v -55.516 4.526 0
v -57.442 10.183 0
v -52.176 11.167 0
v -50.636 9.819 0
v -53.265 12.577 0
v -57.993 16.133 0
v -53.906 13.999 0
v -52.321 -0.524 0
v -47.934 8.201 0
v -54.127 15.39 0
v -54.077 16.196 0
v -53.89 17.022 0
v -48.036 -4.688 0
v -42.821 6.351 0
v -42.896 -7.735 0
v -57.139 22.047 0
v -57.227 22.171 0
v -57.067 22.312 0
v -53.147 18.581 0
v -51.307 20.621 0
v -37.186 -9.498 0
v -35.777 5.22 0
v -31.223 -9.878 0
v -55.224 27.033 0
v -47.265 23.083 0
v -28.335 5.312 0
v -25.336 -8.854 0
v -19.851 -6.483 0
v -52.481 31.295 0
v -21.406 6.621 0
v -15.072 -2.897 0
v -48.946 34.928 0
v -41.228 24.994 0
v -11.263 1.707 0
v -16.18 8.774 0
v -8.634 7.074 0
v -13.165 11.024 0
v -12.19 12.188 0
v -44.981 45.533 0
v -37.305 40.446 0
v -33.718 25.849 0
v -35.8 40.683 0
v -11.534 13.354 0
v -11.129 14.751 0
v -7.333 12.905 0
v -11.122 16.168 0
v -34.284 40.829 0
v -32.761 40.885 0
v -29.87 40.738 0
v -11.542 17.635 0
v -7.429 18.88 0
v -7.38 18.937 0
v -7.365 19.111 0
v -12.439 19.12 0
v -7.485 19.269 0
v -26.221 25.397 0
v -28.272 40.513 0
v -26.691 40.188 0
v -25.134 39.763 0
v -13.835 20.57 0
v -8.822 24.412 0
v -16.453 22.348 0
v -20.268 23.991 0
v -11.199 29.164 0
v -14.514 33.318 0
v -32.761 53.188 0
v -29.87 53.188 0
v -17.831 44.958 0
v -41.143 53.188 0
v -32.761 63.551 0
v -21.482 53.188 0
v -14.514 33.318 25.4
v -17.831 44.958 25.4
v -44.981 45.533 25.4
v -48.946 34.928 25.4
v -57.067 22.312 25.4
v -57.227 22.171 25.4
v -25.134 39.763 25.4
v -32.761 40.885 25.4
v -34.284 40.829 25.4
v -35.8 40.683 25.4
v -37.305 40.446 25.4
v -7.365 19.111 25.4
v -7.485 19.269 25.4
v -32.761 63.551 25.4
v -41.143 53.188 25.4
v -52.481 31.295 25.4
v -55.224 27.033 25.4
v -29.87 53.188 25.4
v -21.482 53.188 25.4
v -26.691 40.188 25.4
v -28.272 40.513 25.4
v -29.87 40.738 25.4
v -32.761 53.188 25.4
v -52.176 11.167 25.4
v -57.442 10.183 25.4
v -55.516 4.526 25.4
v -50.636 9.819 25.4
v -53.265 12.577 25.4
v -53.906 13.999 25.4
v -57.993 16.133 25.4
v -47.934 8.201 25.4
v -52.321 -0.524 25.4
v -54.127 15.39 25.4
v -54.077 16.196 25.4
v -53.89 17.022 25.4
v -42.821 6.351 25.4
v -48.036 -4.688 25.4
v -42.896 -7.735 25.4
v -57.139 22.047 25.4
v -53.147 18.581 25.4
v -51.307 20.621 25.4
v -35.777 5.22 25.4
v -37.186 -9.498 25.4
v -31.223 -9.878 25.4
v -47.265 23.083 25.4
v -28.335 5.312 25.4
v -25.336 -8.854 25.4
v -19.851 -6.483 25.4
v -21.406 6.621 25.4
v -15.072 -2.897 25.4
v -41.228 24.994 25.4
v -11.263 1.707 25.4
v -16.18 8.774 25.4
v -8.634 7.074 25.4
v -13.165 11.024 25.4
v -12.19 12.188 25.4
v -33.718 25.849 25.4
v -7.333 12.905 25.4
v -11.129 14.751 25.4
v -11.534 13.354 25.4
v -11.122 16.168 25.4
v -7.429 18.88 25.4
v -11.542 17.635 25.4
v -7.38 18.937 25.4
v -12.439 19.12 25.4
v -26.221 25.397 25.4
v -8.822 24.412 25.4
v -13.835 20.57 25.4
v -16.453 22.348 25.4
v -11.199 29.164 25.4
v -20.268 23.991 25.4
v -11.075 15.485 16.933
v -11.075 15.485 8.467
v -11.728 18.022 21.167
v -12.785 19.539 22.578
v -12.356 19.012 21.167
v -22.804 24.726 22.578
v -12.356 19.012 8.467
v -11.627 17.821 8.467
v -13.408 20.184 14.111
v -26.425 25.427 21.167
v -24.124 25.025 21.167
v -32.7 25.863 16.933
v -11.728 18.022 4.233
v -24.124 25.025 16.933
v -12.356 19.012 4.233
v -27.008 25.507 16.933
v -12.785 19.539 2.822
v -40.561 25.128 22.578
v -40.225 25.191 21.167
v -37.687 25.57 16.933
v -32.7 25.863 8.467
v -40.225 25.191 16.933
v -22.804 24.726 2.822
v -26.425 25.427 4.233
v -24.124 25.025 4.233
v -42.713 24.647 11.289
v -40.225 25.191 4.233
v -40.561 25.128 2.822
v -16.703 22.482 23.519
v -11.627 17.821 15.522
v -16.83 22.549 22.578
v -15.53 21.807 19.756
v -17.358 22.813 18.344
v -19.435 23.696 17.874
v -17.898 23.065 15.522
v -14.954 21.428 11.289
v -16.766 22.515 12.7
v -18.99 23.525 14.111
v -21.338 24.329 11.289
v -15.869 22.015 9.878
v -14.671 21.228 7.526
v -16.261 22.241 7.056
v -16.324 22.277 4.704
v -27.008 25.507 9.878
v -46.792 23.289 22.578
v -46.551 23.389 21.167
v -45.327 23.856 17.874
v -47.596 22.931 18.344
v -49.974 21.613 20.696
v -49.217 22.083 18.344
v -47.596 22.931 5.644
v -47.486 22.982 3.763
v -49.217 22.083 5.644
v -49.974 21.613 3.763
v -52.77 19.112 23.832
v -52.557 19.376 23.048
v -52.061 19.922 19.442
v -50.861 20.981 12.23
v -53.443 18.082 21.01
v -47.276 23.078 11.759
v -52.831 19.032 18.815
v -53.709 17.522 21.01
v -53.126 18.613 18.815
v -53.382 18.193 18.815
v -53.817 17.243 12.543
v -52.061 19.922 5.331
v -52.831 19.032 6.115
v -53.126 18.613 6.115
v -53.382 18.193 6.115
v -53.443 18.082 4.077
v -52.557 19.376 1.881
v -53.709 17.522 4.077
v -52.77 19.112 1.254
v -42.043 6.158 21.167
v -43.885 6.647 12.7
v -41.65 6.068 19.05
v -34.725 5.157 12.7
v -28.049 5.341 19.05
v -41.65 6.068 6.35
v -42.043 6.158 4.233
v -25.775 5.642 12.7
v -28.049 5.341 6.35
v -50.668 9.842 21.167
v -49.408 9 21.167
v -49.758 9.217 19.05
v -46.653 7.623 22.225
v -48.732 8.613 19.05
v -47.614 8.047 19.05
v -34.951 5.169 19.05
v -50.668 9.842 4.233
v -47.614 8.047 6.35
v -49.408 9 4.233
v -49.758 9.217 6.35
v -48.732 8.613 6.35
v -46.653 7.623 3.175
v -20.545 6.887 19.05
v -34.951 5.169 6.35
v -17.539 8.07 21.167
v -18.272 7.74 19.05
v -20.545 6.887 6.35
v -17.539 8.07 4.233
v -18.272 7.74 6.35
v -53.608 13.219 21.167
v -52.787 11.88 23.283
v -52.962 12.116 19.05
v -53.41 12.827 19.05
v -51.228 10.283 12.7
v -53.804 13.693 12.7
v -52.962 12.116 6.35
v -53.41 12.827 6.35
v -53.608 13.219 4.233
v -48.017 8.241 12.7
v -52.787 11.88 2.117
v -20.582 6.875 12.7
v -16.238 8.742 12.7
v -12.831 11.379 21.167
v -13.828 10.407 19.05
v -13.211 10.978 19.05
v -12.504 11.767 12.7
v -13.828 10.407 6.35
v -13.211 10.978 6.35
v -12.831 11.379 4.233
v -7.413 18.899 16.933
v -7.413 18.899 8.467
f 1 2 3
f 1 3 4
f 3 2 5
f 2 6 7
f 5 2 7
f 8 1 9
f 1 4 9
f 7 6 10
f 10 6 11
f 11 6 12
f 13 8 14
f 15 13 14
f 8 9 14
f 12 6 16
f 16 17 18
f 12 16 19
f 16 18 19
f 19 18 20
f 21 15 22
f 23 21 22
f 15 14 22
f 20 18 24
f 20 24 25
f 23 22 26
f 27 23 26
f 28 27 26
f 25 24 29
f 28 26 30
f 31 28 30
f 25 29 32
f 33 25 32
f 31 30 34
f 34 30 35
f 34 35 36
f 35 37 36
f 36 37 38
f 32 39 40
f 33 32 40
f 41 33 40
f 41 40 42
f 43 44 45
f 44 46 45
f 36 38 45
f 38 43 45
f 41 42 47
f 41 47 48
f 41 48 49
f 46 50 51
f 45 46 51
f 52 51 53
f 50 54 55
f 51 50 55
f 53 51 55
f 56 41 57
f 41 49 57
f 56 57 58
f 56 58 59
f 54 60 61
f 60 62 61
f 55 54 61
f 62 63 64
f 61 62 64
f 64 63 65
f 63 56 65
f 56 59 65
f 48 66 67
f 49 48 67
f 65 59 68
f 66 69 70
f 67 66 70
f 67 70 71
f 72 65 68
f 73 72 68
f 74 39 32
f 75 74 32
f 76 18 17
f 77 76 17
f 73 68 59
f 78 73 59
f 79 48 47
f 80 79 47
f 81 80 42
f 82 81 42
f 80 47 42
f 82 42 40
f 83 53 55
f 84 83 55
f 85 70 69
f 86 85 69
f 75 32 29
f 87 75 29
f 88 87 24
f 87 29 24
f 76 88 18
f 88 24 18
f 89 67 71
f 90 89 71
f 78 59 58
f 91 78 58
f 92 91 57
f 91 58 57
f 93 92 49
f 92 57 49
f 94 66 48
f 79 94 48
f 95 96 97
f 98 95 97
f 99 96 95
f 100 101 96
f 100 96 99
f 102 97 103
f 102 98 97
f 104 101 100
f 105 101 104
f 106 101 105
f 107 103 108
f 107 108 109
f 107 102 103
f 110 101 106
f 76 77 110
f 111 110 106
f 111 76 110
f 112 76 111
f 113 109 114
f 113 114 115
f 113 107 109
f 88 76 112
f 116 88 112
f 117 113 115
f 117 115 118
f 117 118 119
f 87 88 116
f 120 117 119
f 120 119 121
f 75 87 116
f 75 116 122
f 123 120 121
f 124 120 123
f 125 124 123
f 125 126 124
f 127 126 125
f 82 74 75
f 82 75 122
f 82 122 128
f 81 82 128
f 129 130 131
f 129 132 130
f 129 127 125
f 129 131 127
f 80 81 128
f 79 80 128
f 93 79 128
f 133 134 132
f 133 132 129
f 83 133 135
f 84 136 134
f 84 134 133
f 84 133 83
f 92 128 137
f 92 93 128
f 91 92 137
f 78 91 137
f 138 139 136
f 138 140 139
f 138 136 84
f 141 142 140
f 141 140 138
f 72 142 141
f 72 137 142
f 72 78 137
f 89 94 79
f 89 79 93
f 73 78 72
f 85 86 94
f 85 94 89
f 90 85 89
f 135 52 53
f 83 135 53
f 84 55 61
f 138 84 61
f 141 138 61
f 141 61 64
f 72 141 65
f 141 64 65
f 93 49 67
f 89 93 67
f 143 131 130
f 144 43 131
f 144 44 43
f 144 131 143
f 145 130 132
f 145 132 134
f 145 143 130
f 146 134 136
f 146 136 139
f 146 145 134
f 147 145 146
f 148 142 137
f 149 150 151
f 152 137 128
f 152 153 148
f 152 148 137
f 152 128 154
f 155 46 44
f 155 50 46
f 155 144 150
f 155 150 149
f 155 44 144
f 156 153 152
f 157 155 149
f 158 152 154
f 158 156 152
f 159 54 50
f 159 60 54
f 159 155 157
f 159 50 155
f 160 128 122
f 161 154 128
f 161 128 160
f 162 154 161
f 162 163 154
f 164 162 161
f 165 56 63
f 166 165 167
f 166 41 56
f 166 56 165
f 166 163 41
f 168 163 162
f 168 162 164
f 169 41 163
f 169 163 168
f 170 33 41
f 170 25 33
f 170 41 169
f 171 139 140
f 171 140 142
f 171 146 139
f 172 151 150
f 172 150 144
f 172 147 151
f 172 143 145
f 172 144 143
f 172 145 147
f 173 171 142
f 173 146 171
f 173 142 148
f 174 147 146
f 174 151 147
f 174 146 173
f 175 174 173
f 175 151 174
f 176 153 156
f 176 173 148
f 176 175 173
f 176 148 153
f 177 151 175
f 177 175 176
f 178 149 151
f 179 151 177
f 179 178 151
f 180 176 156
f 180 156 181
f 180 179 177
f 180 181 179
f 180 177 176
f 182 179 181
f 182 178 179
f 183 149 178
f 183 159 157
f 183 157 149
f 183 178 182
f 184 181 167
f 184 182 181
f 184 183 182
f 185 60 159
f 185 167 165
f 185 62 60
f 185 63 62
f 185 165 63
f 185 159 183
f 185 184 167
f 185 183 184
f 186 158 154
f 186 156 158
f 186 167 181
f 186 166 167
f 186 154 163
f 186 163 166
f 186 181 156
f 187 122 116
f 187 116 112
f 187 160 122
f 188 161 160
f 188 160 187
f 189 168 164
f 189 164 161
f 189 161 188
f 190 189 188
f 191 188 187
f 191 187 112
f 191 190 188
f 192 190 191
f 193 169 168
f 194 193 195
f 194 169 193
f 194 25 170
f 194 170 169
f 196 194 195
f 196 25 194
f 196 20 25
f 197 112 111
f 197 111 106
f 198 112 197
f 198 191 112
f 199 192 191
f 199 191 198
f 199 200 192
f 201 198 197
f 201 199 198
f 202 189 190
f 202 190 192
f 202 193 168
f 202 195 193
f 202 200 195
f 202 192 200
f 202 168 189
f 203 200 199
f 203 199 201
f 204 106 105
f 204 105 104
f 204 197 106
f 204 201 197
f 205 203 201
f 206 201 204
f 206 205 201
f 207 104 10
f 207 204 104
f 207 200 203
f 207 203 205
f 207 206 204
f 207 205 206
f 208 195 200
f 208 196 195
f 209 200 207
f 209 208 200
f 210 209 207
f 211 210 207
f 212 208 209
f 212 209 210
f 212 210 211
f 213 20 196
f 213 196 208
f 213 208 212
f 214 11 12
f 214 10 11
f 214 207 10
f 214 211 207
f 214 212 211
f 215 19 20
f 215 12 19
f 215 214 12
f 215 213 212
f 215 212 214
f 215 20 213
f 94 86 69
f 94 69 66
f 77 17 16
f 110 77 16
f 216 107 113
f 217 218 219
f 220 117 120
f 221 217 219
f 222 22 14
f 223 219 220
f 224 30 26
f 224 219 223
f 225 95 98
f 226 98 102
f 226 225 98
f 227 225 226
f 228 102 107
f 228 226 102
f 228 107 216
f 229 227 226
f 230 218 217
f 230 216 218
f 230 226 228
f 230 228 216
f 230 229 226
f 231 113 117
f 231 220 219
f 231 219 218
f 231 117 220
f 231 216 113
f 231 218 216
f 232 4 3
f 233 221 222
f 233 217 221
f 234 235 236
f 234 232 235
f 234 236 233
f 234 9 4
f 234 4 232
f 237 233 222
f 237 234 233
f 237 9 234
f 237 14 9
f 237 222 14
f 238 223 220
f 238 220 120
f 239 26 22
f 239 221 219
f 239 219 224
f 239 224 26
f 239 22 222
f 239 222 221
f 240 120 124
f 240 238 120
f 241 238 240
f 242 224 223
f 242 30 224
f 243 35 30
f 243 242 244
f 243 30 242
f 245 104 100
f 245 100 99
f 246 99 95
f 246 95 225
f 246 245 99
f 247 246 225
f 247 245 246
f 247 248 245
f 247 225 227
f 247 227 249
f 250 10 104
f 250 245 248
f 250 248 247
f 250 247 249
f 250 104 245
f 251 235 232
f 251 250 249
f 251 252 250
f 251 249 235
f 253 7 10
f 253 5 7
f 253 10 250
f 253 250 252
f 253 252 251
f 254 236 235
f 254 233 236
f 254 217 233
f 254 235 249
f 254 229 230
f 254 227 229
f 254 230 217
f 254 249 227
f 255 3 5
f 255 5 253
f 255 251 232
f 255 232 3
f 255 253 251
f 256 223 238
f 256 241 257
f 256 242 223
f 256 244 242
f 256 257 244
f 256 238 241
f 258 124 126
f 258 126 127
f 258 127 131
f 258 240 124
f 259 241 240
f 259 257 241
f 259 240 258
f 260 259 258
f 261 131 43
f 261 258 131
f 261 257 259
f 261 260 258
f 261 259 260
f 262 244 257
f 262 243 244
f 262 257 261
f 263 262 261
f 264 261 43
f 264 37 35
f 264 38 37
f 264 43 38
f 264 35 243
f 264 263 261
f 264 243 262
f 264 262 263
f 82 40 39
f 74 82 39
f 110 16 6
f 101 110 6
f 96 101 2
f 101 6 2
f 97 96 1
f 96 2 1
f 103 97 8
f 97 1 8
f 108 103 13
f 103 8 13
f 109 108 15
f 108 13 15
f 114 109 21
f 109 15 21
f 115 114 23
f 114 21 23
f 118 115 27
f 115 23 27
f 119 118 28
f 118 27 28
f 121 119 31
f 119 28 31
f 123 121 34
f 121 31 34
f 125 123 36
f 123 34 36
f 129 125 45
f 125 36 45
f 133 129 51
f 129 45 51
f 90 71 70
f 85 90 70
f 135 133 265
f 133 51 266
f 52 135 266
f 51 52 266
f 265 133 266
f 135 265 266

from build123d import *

# Parameters (mm, degrees)
F1_DEPTH = 25.4


with BuildPart() as f1:
    # F0 (on Top) → F1 (new body)
    with BuildSketch(Plane.XY):
        with BuildLine():
            Line((-44.980506, 45.533263), (-48.945944, 34.927538))
            ThreePointArc((-48.945944, 34.927538), (-53.959094, 29.232874), (-57.06671, 22.311632))
            ThreePointArc((-57.06671, 22.311632), (-57.10328, 22.179189), (-57.139133, 22.046551))
            add(Edge.make_bspline(
                [(-57.139133, 22.046551), (-55.951402, 19.76674), (-56.362879, 17.207652), (-54.538533, 15.65998), (-54.126684, 15.39029)],
                knots=[0, 0, 0, 0, 6.068521, 7.551351, 7.551351, 7.551351, 7.551351], degree=3))
            add(Edge.make_bspline(
                [(-11.074984, 15.485006), (-11.074984, 25.910861), (-32.699511, 25.863286), (-54.324038, 25.815711), (-54.126684, 15.39029)],
                knots=[0, 0, 0, 1.57536, 1.57536, 3.150719, 3.150719, 3.150719], degree=2, weights=[1, 0.705492, 1, 0.705492, 1]))
            add(Edge.make_bspline(
                [(-11.533519, 13.35431), (-11.074984, 14.40819), (-11.074984, 15.485006)],
                knots=[6.076414, 6.076414, 6.076414, 6.283185, 6.283185, 6.283185], degree=2, weights=[1, 0.99466, 1]))
            add(Edge.make_bspline(
                [(-11.533519, 13.35431), (-10.470214, 13.677684), (-9.705303, 14.334247), (-9.811295, 16.948305), (-8.481348, 17.689314), (-7.429187, 18.879946)],
                knots=[49.568314, 49.568314, 49.568314, 49.568314, 52.956399, 53.261198, 57.215077, 57.215077, 57.215077, 57.215077], degree=3))
            ThreePointArc((-7.429187, 18.879946), (-7.456191, 19.074493), (-7.484699, 19.268824))
            ThreePointArc((-7.484699, 19.268824), (-9.885867, 26.850301), (-14.513804, 33.317649))
            Line((-14.513804, 33.317649), (-17.8308, 44.958003))
            Line((-17.8308, 44.958003), (-25.134036, 39.762573))
            ThreePointArc((-25.134036, 39.762573), (-27.478957, 40.363145), (-29.8704, 40.737774))
            Line((-29.8704, 40.737774), (-29.8704, 53.187601))
            Line((-29.8704, 53.187601), (-21.482418, 53.187601))
            Line((-21.482418, 53.187601), (-32.760906, 63.5508))
            Line((-32.760906, 63.5508), (-41.142906, 53.187601))
            Line((-41.142906, 53.187601), (-32.760906, 53.187601))
            Line((-32.760906, 53.187601), (-32.760906, 40.884505))
            ThreePointArc((-32.760906, 40.884505), (-35.042987, 40.767373), (-37.305306, 40.445618))
            Line((-37.305306, 40.445618), (-44.980506, 45.533263))
        make_face()
        with BuildLine():
            ThreePointArc((-57.139133, 22.046551), (-57.10328, 22.179189), (-57.06671, 22.311632))
            Line((-57.06671, 22.311632), (-57.226889, 22.170573))
            Line((-57.226889, 22.170573), (-57.139133, 22.046551))
        make_face()
        with BuildLine():
            add(Edge.make_bspline(
                [(-57.139133, 22.046551), (-55.951402, 19.76674), (-56.362879, 17.207652), (-54.538533, 15.65998), (-54.126684, 15.39029)],
                knots=[0, 0, 0, 0, 6.068521, 7.551351, 7.551351, 7.551351, 7.551351], degree=3))
            ThreePointArc((-57.139133, 22.046551), (-34.216031, -9.863615), (-7.429187, 18.879946))
            add(Edge.make_bspline(
                [(-11.533519, 13.35431), (-10.470214, 13.677684), (-9.705303, 14.334247), (-9.811295, 16.948305), (-8.481348, 17.689314), (-7.429187, 18.879946)],
                knots=[49.568314, 49.568314, 49.568314, 49.568314, 52.956399, 53.261198, 57.215077, 57.215077, 57.215077, 57.215077], degree=3))
            add(Edge.make_bspline(
                [(-54.126684, 15.39029), (-53.950368, 6.076234), (-34.725104, 5.157255), (-15.499841, 4.238275), (-11.533519, 13.35431)],
                knots=[3.150719, 3.150719, 3.150719, 4.613566, 4.613566, 6.076414, 6.076414, 6.076414], degree=2, weights=[1, 0.744224, 1, 0.744224, 1]))
        make_face()
        with BuildLine():
            ThreePointArc((-7.484699, 19.268824), (-7.456191, 19.074493), (-7.429187, 18.879946))
            add(Edge.make_bspline(
                [(-7.429187, 18.879946), (-7.412604, 18.898711), (-7.396067, 18.917601), (-7.37958, 18.936621)],
                knots=[57.215077, 57.215077, 57.215077, 57.215077, 57.277393, 57.277393, 57.277393, 57.277393], degree=3))
            Line((-7.37958, 18.936621), (-7.364804, 19.111022))
            Line((-7.364804, 19.111022), (-7.484699, 19.268824))
        make_face()
    extrude(amount=F1_DEPTH)


solid = f1.part
